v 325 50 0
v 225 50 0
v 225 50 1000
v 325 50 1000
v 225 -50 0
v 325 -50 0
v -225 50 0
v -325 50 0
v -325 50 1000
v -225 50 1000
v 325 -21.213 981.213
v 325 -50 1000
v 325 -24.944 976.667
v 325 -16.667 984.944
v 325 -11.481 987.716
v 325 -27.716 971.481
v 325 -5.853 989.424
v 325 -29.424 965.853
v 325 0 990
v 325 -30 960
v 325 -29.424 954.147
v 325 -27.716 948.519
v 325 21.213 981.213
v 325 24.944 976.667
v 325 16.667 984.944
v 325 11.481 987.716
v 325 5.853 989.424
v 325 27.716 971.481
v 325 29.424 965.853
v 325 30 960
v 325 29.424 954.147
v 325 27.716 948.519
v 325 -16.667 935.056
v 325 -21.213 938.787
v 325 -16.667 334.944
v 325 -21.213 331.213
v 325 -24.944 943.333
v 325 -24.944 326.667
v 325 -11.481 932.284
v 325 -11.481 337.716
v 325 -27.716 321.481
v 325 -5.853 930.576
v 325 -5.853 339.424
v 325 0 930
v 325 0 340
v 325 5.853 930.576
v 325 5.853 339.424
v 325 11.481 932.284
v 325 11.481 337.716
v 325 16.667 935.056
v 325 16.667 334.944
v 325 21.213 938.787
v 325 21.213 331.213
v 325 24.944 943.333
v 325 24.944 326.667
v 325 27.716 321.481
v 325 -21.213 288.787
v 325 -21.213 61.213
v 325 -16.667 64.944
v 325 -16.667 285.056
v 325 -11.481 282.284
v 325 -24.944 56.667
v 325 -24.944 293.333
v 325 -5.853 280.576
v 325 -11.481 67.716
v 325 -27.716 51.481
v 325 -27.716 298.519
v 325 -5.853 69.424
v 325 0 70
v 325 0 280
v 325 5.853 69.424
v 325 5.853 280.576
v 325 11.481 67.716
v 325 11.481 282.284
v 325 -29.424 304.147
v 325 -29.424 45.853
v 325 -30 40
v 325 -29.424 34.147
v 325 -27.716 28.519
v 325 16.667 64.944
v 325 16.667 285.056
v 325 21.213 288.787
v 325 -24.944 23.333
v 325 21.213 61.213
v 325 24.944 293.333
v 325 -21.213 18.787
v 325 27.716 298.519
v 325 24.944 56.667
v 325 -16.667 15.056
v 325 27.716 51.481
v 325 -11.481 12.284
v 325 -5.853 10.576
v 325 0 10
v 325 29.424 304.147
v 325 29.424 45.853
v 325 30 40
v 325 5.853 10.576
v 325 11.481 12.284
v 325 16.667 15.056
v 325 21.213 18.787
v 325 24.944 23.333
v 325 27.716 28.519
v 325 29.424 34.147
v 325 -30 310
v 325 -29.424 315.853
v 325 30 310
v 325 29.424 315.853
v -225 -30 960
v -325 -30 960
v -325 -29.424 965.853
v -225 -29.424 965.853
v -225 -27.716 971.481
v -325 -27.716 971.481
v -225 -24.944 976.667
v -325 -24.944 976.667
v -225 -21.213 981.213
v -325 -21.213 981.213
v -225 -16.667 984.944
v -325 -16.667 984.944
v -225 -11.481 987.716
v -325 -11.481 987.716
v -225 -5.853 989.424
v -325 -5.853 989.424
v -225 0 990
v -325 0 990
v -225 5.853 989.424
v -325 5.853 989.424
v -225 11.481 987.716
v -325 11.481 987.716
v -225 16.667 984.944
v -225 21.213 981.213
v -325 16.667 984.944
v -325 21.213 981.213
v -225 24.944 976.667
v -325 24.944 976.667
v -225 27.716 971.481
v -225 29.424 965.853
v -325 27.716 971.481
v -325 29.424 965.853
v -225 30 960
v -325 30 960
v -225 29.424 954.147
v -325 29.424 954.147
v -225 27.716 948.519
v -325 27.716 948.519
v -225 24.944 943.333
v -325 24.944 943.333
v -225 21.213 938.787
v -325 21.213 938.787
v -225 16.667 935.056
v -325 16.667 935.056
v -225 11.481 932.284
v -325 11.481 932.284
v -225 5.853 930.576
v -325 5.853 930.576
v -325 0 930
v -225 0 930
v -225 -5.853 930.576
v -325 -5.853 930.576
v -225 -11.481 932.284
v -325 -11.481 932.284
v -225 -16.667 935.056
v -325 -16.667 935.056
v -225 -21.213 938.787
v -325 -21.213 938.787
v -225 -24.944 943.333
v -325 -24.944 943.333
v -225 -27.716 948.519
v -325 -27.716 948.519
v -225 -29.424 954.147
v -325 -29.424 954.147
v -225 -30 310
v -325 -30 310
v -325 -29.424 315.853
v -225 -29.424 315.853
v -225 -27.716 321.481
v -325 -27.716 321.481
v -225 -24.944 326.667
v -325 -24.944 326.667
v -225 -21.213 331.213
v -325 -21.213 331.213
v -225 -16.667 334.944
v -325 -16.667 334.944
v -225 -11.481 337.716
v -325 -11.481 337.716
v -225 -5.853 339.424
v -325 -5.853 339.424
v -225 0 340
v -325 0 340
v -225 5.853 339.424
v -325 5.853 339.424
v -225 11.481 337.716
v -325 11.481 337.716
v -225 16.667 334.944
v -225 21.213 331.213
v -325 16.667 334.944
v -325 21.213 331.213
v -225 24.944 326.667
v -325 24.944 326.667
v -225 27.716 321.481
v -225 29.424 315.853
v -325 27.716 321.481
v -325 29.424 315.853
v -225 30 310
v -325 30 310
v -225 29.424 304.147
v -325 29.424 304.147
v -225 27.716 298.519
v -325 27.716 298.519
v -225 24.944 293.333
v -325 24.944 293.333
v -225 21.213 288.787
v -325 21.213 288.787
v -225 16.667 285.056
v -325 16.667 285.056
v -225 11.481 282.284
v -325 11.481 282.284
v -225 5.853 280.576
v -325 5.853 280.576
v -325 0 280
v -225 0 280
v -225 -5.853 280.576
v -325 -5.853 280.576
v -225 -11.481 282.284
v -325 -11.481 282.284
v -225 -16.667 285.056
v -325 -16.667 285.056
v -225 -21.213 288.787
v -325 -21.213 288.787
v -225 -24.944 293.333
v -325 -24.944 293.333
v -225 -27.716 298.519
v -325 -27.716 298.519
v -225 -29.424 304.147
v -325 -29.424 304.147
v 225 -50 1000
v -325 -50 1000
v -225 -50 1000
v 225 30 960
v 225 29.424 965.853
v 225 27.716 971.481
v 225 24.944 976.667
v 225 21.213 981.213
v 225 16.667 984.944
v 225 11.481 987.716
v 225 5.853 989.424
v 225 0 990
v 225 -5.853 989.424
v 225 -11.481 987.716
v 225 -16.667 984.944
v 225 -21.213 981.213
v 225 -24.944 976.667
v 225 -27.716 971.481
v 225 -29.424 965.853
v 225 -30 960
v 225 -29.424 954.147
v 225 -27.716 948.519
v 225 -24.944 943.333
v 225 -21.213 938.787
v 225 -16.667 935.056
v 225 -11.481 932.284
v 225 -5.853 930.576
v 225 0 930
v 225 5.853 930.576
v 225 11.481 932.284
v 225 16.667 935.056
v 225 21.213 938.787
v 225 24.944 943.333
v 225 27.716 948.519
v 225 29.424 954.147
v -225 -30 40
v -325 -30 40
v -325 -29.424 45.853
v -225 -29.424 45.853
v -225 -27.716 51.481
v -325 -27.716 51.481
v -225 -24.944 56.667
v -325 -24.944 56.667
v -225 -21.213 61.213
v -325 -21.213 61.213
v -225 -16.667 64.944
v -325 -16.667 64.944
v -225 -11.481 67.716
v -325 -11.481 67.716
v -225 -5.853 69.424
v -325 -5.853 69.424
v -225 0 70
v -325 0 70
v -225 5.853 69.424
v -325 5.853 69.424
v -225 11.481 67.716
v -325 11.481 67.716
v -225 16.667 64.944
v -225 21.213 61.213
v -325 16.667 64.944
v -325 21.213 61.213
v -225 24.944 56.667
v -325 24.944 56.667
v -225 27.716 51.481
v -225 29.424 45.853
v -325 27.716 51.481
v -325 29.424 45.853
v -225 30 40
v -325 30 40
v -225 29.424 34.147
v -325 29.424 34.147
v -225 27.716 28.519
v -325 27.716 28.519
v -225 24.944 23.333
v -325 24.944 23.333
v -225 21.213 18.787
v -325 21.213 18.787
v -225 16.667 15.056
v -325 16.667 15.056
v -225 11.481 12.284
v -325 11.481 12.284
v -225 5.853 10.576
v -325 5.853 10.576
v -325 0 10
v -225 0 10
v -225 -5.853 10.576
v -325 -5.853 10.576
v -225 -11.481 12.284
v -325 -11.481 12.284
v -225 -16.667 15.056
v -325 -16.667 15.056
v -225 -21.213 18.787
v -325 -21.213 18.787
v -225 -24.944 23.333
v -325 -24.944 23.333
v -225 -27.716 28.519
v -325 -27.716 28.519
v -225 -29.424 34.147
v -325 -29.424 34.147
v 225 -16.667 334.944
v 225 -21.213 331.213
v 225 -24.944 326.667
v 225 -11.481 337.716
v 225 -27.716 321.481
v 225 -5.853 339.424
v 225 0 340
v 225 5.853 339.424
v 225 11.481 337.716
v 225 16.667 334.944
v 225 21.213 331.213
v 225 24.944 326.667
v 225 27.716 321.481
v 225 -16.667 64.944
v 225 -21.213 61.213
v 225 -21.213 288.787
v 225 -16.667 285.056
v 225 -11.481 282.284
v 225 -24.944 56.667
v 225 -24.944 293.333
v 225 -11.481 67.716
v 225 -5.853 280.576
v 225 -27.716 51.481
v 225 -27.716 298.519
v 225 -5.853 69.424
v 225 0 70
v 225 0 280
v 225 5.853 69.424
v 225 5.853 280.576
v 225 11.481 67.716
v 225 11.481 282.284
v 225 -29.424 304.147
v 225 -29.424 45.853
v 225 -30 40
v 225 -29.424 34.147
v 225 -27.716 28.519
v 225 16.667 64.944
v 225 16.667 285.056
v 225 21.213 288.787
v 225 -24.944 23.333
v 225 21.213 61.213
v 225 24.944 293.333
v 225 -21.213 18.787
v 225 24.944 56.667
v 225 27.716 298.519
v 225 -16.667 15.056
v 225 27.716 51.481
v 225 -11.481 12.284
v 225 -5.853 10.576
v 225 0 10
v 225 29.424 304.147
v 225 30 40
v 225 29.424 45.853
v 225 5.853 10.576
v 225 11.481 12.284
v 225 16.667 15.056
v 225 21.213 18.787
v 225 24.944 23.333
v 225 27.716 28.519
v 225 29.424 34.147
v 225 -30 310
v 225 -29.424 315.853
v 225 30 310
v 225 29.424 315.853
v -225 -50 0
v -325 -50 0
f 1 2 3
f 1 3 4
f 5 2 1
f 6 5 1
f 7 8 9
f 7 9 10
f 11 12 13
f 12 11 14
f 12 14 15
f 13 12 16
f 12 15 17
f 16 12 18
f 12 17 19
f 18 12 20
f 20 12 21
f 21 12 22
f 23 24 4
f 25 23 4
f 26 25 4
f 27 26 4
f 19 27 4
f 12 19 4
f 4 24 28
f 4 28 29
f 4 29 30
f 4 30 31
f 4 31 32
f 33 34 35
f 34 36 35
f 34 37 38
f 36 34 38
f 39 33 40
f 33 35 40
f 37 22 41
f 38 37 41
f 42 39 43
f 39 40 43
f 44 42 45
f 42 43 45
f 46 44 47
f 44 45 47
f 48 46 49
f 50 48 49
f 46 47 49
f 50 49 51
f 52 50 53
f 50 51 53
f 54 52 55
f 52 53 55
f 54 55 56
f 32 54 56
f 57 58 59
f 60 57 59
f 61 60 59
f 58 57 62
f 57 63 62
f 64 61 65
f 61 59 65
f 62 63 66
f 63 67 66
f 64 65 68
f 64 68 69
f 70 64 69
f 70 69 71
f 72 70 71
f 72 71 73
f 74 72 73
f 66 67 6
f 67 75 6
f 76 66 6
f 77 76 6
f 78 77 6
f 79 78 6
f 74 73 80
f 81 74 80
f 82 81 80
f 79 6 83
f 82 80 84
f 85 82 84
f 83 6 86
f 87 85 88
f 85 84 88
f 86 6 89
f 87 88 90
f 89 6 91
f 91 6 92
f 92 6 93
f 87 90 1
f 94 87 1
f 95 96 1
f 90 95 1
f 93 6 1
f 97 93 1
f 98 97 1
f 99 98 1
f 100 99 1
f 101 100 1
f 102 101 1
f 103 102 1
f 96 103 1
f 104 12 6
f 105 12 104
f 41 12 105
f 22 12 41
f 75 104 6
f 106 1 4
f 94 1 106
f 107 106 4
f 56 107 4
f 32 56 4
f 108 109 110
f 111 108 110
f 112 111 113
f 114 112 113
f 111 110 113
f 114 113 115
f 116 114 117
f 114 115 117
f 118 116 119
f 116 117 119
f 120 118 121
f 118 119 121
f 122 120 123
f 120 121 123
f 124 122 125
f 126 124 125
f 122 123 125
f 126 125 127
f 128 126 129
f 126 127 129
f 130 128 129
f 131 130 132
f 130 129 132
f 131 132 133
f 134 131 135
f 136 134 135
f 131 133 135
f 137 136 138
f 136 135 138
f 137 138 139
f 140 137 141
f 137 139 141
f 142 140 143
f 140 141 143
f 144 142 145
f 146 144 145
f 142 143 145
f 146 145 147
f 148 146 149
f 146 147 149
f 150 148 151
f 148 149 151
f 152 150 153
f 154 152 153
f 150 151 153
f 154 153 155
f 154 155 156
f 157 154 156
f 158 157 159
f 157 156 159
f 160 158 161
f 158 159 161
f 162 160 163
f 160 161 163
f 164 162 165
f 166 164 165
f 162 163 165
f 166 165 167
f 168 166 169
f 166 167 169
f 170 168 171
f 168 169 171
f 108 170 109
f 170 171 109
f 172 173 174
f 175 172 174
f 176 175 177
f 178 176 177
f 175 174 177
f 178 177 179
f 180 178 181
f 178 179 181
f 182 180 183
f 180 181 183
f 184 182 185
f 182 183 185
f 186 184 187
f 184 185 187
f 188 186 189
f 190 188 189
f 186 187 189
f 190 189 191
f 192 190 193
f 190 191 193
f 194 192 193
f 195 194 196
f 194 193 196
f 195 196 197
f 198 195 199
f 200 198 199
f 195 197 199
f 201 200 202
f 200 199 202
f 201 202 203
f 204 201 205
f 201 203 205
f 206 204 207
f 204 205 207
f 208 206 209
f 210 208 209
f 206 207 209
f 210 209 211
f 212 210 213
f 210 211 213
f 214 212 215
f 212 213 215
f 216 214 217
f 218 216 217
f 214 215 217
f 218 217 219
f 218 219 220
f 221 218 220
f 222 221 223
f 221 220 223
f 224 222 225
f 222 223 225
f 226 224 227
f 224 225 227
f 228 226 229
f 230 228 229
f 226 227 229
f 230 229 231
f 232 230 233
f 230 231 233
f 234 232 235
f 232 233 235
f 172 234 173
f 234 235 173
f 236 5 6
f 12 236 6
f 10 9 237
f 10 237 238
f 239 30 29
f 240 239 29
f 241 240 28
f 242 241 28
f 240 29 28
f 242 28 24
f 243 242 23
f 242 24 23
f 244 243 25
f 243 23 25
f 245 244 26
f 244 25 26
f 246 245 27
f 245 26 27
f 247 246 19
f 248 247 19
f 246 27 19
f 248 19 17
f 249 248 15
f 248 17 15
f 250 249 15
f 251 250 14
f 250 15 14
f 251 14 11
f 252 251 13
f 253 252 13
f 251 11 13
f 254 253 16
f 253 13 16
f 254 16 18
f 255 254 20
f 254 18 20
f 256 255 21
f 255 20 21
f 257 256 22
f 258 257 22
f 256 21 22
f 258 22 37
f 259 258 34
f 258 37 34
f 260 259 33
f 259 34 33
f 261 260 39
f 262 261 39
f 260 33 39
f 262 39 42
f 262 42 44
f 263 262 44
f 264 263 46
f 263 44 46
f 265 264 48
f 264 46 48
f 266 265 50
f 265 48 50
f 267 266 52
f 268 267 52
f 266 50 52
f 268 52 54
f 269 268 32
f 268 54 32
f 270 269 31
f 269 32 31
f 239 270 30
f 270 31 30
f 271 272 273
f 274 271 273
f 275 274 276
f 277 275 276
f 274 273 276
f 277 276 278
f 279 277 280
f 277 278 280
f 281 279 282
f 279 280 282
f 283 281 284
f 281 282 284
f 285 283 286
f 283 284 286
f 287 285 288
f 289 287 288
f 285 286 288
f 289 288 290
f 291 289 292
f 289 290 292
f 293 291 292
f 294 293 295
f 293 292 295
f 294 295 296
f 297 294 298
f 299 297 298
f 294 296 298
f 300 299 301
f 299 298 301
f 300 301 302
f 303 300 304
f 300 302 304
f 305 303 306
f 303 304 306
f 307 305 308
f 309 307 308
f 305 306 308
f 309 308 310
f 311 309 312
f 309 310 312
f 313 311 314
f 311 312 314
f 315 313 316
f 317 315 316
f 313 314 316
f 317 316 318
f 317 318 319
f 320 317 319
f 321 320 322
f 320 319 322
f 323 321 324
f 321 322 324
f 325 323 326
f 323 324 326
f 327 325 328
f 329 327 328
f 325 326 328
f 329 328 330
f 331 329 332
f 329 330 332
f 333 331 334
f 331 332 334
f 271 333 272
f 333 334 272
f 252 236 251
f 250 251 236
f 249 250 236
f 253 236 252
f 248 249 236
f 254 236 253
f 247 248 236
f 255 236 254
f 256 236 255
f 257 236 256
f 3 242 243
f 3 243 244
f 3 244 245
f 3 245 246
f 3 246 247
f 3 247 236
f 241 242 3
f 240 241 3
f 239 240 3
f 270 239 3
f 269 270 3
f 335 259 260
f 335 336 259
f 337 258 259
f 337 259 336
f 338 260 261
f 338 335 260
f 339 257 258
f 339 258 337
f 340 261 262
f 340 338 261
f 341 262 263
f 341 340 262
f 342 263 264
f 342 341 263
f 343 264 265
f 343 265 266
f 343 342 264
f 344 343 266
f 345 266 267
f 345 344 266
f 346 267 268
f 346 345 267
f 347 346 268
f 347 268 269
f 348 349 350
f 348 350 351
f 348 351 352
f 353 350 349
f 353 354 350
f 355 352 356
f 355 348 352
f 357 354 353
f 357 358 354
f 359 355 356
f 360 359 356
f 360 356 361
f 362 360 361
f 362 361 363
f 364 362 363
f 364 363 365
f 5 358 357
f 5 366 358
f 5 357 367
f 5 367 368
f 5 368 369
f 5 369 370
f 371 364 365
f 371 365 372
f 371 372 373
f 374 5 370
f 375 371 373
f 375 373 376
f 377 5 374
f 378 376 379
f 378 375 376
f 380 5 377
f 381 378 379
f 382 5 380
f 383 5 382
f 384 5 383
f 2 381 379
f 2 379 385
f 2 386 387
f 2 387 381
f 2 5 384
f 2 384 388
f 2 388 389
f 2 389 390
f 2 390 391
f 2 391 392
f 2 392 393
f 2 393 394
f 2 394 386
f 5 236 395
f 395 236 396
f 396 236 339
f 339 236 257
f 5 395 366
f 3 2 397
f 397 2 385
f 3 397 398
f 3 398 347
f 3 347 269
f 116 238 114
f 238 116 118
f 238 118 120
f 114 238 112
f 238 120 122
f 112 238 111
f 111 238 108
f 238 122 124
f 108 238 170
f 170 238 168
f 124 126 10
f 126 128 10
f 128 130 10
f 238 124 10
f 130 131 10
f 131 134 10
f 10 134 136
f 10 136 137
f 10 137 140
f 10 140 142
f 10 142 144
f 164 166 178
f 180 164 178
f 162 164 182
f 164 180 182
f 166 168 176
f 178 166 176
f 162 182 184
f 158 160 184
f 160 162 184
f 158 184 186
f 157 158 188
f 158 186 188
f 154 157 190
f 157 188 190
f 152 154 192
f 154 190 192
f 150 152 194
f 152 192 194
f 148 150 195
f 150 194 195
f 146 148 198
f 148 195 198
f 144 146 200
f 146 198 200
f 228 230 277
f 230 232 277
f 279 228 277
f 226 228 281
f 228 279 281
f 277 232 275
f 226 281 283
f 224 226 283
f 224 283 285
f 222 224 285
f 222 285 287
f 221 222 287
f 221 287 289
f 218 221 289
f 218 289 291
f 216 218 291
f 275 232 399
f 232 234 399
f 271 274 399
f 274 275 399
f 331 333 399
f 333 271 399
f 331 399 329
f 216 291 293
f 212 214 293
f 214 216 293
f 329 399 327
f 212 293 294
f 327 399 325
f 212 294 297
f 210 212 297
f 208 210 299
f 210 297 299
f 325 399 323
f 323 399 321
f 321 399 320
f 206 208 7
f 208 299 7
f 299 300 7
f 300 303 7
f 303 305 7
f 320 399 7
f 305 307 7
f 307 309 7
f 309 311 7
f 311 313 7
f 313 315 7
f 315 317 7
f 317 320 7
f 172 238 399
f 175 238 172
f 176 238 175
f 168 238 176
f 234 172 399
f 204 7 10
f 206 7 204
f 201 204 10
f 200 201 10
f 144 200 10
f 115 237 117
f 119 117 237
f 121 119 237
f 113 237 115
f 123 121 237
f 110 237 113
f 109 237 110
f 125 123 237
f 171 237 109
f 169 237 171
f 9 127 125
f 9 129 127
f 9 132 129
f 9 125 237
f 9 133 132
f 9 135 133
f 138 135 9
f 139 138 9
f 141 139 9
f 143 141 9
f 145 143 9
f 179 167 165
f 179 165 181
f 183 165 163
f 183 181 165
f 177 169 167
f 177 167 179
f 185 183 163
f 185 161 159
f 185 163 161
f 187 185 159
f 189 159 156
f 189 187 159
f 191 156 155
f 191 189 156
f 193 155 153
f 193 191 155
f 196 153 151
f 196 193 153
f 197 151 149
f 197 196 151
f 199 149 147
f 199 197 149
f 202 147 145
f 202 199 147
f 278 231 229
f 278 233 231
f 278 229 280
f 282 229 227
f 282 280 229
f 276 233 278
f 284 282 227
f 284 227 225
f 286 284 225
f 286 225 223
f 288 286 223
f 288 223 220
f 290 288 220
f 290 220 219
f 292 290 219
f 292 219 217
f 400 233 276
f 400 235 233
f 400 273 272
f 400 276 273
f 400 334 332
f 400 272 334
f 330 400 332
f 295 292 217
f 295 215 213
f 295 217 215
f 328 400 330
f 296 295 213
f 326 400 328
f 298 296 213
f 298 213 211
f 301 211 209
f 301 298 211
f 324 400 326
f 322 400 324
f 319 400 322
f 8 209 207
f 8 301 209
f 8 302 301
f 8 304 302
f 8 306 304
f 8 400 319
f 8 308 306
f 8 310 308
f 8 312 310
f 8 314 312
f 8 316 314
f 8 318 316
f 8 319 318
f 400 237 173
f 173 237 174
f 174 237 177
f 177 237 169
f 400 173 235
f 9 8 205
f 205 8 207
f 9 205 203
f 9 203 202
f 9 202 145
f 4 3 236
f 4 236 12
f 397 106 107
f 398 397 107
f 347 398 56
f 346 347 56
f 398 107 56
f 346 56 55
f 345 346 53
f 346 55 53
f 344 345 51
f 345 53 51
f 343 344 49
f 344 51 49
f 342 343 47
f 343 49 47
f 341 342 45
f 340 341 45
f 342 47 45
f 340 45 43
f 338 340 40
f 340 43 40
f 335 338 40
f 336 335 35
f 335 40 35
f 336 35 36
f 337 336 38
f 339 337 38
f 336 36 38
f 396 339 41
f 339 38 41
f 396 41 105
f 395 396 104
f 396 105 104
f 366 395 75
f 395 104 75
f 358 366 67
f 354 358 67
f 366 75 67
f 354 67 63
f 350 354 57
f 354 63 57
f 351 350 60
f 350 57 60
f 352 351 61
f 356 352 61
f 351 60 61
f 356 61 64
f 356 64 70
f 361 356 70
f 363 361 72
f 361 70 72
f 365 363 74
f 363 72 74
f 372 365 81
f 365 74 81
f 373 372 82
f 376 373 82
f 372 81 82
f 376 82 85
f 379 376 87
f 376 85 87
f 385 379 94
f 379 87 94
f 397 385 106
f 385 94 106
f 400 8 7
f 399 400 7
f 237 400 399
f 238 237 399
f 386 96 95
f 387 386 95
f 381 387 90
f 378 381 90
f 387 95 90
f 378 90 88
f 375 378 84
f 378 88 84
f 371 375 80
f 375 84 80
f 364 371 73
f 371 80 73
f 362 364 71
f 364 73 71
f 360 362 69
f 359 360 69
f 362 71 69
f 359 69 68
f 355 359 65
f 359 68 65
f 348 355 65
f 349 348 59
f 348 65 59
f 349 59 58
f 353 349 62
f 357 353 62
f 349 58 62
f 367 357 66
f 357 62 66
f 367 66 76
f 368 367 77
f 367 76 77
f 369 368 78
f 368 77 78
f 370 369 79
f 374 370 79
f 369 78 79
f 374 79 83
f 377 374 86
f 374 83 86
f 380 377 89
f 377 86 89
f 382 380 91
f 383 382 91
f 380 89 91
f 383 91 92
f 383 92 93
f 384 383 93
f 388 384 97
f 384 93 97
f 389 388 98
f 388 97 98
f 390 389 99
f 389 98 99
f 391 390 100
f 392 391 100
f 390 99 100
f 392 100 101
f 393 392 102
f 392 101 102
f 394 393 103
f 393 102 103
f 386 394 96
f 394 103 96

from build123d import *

# Parameters (mm, degrees)
F0_W      = 100
F0_H      = 100
F1_DEPTH  = 1000
F2_R      = 30
F3_DEPTH  = 100
F4_R      = 30
F5_DEPTH  = 100
F6_R      = 30
F7_DEPTH  = 100
F8_R      = 30
F9_DEPTH  = 100
F10_R     = 30
F11_DEPTH = 100
F12_R     = 30
F13_DEPTH = 100


with BuildPart() as f1:
    # F0 (on Top) → F1 (new body)
    with BuildSketch(Plane.XY):
        with Locations((-275, 0)):
            Rectangle(F0_W, F0_H)
        with Locations((275, 0)):
            Rectangle(F0_W, F0_H)
    extrude(amount=F1_DEPTH)

    # F2 (on face) → F3 (cut)
    with BuildSketch(Plane(origin=(-325, 0, 0), x_dir=(0, -1, 0), z_dir=(-1, 0, 0))):
        with Locations((0, 960)):
            Circle(F2_R)
    extrude(amount=-F3_DEPTH, mode=Mode.SUBTRACT)

    # F4 (on face) → F5 (cut)
    with BuildSketch(Plane.YZ.offset(325)):
        with Locations((0, 40)):
            Circle(F4_R)
    extrude(amount=-F5_DEPTH, mode=Mode.SUBTRACT)

    # F6 (on face) → F7 (cut)
    with BuildSketch(Plane.YZ.offset(325)):
        with Locations((0, 960)):
            Circle(F6_R)
    extrude(amount=-F7_DEPTH, mode=Mode.SUBTRACT)

    # F8 (on face) → F9 (cut)
    with BuildSketch(Plane(origin=(-325, 0, 0), x_dir=(0, -1, 0), z_dir=(-1, 0, 0))):
        with Locations((0, 40)):
            Circle(F8_R)
    extrude(amount=-F9_DEPTH, mode=Mode.SUBTRACT)

    # F10 (on face) → F11 (cut)
    with BuildSketch(Plane.YZ.offset(325)):
        with Locations((0, 310)):
            Circle(F10_R)
    extrude(amount=-F11_DEPTH, mode=Mode.SUBTRACT)

    # F12 (on face) → F13 (cut)
    with BuildSketch(Plane(origin=(-325, 0, 0), x_dir=(0, -1, 0), z_dir=(-1, 0, 0))):
        with Locations((0, 310)):
            Circle(F12_R)
    extrude(amount=-F13_DEPTH, mode=Mode.SUBTRACT)


solid = f1.part
